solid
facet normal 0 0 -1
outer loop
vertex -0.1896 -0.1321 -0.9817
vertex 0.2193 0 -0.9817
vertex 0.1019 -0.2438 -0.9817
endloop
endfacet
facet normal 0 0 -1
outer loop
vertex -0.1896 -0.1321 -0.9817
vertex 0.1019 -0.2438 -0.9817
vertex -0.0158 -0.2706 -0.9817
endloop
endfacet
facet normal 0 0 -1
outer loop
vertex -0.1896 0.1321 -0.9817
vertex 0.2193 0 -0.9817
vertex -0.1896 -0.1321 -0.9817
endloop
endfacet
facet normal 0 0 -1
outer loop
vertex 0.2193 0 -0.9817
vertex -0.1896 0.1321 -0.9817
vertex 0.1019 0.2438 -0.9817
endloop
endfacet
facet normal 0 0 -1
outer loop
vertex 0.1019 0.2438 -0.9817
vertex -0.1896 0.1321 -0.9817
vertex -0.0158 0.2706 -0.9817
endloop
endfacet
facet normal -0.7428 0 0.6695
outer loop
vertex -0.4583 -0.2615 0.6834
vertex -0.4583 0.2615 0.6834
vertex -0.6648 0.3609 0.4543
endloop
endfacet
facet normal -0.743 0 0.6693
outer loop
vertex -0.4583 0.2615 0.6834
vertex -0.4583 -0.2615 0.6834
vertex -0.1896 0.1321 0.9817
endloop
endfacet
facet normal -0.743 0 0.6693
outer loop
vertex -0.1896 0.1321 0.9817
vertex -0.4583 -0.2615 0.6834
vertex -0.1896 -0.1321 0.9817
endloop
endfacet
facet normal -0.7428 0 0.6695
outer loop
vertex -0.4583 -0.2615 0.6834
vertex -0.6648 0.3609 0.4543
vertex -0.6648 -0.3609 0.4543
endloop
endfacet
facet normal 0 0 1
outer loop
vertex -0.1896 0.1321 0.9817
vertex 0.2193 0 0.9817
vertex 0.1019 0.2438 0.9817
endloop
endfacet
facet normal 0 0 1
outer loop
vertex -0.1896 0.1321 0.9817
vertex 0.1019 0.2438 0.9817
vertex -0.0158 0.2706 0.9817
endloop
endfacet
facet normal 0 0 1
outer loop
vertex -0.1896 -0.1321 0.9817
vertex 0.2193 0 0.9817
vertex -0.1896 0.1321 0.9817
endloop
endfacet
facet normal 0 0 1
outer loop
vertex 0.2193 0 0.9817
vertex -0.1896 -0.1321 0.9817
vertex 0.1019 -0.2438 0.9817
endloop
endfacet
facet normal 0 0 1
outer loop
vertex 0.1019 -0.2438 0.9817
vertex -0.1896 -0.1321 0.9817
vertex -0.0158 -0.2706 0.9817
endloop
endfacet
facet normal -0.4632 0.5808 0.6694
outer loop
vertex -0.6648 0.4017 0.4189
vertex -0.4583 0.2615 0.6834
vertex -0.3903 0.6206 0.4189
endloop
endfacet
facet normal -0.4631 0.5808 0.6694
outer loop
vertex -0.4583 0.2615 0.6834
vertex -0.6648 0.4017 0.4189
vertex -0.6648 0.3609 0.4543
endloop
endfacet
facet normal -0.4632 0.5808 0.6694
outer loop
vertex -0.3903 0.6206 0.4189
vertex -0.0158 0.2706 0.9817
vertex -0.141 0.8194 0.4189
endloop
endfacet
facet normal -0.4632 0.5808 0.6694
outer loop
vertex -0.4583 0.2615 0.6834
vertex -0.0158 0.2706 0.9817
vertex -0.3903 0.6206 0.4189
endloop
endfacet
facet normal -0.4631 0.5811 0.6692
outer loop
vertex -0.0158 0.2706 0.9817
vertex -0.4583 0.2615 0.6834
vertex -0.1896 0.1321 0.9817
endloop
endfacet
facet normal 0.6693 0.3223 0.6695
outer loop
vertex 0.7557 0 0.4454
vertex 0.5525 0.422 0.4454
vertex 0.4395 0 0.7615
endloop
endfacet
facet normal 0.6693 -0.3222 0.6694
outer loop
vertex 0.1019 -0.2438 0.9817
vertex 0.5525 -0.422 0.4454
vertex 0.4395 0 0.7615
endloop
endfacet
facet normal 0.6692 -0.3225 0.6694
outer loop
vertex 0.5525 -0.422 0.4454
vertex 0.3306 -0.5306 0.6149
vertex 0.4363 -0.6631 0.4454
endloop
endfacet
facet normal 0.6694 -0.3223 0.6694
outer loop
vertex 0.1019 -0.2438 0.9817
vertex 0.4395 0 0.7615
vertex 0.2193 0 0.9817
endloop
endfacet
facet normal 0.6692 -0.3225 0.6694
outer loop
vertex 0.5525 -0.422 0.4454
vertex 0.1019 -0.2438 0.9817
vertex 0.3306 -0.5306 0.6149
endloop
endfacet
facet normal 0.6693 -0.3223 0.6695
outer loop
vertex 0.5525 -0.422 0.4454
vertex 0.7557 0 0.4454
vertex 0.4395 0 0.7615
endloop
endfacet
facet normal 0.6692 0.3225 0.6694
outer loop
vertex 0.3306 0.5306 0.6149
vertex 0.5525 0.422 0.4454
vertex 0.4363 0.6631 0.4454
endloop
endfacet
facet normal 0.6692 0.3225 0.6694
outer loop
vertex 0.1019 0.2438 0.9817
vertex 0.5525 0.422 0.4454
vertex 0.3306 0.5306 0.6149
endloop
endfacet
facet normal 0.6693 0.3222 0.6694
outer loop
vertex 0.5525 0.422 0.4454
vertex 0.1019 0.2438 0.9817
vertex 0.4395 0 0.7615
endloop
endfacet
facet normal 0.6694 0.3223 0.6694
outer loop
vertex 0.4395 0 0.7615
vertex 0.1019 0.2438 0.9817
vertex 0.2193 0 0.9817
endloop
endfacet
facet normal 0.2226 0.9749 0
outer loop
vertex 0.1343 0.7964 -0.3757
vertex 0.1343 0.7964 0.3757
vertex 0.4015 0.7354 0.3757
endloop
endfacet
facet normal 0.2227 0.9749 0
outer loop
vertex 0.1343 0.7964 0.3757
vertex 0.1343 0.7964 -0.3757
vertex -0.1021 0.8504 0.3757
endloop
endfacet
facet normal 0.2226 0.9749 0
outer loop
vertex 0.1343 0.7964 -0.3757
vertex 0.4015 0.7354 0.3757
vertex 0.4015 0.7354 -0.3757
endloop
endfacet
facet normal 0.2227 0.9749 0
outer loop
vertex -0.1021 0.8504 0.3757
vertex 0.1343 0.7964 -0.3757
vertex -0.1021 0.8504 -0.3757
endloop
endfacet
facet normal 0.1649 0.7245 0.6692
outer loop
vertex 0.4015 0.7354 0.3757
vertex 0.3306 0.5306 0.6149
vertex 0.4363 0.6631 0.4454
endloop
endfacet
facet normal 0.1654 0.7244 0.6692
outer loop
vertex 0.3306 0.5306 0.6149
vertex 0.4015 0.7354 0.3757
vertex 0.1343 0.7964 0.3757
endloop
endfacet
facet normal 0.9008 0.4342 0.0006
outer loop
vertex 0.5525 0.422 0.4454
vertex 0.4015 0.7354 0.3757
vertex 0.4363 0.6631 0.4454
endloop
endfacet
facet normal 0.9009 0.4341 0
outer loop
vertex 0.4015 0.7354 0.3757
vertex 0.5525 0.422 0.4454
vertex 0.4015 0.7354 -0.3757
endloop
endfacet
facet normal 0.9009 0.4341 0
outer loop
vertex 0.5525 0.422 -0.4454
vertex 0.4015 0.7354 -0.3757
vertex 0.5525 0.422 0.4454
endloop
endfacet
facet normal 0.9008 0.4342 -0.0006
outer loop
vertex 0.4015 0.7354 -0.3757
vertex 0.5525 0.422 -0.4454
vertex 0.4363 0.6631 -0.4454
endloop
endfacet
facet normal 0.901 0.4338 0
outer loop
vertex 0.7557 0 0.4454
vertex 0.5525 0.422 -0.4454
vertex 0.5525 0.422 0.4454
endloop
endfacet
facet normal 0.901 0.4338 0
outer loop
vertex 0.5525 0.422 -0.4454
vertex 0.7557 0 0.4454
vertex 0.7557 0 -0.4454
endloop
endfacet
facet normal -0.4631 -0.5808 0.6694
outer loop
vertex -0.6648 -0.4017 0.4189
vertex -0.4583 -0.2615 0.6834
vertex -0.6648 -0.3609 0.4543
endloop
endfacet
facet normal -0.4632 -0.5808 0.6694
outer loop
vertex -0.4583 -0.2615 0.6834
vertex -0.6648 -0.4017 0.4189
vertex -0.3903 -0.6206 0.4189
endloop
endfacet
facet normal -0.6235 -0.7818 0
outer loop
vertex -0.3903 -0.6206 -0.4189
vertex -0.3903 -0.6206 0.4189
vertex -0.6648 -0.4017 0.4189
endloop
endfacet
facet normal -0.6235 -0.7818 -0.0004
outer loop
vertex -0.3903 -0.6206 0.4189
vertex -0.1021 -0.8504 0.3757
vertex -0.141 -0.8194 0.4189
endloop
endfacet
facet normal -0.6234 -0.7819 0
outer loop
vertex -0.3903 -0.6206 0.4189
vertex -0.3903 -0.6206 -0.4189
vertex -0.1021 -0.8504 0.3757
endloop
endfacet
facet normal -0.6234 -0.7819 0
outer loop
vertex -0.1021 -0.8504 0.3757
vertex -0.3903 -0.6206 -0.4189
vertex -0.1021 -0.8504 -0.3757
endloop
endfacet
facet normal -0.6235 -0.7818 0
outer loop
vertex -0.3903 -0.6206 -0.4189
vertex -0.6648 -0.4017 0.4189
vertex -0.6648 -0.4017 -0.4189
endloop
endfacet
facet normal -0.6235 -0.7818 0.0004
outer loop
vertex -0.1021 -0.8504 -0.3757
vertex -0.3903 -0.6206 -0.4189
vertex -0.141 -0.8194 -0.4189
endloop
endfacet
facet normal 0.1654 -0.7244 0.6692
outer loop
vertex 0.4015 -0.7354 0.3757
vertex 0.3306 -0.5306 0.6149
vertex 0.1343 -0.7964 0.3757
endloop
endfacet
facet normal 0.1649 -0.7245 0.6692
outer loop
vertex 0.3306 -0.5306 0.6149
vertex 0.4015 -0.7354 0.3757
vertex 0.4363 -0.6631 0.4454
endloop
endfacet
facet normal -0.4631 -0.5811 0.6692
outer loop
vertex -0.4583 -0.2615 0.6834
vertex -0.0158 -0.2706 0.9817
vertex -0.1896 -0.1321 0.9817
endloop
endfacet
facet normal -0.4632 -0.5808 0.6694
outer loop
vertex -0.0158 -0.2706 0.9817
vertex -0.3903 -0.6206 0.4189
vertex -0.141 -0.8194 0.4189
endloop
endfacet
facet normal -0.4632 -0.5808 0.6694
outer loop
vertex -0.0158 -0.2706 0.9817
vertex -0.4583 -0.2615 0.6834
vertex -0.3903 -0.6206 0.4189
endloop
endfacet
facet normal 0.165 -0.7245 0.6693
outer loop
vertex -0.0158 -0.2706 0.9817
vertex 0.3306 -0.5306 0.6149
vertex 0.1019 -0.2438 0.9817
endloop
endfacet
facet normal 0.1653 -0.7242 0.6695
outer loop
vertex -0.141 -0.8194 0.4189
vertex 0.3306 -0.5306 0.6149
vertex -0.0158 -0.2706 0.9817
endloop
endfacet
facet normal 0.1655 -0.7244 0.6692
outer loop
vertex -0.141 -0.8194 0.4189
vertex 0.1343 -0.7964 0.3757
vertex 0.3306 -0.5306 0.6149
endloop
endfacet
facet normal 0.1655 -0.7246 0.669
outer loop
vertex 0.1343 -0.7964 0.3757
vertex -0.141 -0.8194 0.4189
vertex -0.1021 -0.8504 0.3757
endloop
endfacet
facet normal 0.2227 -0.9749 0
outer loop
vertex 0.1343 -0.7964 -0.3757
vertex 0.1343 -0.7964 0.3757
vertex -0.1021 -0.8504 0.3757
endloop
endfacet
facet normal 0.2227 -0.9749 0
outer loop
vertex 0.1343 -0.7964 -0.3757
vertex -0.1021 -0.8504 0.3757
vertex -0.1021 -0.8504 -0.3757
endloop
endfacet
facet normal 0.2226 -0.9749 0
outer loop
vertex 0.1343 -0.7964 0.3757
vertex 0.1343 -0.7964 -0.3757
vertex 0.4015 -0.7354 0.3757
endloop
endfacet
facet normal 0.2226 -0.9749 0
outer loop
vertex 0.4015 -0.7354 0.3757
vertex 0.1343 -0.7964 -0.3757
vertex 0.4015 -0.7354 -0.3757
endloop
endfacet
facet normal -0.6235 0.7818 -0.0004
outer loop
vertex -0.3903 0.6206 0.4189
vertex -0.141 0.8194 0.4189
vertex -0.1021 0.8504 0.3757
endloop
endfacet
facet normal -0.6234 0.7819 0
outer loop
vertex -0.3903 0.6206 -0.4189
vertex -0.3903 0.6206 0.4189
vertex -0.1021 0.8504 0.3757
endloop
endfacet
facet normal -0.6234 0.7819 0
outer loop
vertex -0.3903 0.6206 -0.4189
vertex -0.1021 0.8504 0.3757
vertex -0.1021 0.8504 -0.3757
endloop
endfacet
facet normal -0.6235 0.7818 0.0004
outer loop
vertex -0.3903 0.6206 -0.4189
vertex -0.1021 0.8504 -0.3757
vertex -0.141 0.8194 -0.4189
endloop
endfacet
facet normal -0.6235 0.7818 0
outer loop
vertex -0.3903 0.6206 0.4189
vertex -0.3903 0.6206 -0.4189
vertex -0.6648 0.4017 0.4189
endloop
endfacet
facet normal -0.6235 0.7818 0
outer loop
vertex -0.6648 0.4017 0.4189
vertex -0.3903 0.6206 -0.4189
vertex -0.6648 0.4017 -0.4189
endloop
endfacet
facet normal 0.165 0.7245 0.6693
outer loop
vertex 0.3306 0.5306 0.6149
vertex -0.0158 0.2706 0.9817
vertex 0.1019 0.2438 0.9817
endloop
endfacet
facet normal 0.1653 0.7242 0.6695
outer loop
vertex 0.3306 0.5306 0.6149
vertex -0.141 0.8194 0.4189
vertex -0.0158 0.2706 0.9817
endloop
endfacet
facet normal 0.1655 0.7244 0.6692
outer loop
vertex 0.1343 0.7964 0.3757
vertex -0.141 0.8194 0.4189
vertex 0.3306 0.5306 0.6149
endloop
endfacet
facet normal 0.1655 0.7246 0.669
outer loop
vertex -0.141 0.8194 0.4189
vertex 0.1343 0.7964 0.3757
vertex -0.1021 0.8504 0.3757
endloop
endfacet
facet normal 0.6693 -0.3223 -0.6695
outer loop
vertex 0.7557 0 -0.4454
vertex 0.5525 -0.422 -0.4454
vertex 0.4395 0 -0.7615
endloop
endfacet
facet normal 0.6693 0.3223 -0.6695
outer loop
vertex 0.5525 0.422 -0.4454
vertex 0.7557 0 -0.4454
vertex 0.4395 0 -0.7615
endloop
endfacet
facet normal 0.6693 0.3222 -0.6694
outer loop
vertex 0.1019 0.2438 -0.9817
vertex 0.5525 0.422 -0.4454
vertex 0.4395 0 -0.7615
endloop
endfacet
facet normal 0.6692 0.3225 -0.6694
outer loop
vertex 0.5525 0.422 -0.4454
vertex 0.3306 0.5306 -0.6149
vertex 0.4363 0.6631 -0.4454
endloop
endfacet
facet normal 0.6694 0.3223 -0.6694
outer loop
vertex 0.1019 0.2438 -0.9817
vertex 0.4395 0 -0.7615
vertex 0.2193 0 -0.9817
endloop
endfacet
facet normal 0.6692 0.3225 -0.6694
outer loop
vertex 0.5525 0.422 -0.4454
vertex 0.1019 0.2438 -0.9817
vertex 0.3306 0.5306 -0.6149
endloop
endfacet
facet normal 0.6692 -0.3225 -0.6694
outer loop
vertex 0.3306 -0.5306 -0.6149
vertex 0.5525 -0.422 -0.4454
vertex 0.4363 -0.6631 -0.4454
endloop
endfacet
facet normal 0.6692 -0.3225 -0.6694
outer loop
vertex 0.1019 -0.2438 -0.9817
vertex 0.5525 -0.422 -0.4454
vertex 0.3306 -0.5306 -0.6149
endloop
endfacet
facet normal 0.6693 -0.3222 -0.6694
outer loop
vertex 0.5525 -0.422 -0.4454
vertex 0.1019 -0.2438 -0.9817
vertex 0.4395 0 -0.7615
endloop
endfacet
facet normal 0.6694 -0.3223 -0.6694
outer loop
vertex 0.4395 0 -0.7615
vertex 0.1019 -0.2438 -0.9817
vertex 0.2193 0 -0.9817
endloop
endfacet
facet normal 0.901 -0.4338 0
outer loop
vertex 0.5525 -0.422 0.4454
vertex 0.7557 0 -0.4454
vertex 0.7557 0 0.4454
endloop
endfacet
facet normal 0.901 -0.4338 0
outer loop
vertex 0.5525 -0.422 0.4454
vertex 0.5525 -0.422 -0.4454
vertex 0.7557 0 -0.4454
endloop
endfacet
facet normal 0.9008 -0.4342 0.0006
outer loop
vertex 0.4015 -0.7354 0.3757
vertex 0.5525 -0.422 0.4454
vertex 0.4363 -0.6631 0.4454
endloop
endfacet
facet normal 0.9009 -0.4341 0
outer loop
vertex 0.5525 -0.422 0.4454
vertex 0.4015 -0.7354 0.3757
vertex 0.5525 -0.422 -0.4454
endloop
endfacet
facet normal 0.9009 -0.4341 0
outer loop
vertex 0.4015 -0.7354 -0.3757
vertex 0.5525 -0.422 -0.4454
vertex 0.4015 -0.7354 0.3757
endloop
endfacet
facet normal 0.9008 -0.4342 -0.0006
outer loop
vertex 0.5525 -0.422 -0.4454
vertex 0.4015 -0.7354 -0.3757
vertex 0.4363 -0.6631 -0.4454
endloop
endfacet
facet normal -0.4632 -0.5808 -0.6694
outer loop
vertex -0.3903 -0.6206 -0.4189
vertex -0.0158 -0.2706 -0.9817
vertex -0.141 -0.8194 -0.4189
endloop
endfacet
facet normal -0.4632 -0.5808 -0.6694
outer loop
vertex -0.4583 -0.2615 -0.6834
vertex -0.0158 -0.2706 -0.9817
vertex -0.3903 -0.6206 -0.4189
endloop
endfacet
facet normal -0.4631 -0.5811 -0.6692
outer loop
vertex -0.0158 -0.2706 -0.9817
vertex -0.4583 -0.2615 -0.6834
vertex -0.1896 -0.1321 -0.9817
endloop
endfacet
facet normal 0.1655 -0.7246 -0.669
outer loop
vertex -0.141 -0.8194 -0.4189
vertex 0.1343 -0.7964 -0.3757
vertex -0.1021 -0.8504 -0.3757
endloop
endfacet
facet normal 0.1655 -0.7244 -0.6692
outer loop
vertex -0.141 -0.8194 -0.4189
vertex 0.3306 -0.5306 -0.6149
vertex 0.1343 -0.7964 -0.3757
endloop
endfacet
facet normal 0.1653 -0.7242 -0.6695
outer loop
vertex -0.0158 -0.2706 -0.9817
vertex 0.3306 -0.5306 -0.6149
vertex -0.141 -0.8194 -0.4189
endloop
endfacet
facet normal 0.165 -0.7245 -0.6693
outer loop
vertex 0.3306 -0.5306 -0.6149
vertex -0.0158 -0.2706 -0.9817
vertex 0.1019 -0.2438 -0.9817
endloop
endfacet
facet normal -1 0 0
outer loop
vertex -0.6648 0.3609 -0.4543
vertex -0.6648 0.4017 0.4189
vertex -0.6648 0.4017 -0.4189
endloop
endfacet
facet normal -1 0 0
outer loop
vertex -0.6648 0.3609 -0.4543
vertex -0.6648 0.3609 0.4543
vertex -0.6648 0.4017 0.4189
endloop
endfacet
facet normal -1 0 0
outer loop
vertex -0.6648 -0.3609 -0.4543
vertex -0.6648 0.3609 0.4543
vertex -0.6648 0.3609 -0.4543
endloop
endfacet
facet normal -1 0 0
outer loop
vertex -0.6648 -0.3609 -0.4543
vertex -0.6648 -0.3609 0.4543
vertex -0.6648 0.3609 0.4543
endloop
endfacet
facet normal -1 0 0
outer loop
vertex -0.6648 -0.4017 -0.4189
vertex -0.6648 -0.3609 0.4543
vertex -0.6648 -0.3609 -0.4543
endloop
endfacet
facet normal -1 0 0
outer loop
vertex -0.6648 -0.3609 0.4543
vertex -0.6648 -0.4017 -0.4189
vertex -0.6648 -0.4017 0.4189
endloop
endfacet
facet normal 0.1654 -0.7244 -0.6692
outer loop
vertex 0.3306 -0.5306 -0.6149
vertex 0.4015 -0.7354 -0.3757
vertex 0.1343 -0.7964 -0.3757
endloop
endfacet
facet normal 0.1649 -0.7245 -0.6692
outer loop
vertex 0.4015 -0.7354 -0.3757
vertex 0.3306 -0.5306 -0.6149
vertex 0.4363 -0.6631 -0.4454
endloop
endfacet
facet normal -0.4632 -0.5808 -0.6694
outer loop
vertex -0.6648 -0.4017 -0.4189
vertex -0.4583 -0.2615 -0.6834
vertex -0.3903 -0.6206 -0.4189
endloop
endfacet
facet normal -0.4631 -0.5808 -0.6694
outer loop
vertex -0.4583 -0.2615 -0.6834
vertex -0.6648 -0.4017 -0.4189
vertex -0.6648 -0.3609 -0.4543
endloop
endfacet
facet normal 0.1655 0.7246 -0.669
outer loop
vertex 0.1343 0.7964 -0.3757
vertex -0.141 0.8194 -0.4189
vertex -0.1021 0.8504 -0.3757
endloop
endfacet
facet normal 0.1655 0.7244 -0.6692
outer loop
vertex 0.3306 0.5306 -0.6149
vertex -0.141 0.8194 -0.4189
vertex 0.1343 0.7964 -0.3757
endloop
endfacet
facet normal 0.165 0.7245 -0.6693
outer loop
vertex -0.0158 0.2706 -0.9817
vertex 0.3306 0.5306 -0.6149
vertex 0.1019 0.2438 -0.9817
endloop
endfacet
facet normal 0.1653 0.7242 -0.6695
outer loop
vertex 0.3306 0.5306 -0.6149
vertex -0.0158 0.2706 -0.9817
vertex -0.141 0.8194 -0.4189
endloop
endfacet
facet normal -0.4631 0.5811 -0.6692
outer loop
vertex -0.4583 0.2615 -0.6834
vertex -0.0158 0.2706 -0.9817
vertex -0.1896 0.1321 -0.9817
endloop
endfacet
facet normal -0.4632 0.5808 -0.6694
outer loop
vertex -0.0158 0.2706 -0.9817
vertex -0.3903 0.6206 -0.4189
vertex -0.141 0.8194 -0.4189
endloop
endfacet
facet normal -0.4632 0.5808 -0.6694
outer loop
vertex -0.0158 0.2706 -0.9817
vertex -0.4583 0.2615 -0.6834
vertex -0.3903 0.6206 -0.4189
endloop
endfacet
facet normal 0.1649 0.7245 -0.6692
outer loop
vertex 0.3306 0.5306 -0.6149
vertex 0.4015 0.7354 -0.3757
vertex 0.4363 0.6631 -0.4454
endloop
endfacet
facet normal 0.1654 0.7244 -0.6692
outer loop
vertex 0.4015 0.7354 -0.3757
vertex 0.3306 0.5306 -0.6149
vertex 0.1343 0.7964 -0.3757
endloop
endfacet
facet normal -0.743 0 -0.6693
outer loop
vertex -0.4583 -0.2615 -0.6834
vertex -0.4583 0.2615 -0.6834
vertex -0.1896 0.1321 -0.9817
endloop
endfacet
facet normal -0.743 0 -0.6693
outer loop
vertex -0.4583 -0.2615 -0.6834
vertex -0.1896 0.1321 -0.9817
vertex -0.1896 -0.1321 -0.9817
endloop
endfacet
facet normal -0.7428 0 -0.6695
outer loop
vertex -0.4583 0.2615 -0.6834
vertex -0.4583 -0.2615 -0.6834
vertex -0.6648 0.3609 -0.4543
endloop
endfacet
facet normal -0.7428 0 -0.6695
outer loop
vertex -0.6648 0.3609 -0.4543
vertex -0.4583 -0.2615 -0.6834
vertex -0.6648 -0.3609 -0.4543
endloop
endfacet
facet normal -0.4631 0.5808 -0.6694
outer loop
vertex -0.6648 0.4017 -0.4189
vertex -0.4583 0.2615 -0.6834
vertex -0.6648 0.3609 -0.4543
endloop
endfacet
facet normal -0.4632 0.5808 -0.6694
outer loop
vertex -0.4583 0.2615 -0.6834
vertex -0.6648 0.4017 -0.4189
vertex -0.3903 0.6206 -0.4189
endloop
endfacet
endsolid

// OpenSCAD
    module base() {
    //difference (){
    //cube(10);
    //translate ([1,1,1])cube(10);}
     resize([10,10,10])import("tote.stl", convexity=3);
        }
    
    difference (){
    translate ([-4,-4,-4])
    cube(18);
    minkowski(){ 
    difference (){
    translate ([-5,-5,-5])
    cube(20);
    minkowski(){
    //base();
    sphere(2,center=true); 
    }
    }  
    sphere(1,center=true); 
    }}
